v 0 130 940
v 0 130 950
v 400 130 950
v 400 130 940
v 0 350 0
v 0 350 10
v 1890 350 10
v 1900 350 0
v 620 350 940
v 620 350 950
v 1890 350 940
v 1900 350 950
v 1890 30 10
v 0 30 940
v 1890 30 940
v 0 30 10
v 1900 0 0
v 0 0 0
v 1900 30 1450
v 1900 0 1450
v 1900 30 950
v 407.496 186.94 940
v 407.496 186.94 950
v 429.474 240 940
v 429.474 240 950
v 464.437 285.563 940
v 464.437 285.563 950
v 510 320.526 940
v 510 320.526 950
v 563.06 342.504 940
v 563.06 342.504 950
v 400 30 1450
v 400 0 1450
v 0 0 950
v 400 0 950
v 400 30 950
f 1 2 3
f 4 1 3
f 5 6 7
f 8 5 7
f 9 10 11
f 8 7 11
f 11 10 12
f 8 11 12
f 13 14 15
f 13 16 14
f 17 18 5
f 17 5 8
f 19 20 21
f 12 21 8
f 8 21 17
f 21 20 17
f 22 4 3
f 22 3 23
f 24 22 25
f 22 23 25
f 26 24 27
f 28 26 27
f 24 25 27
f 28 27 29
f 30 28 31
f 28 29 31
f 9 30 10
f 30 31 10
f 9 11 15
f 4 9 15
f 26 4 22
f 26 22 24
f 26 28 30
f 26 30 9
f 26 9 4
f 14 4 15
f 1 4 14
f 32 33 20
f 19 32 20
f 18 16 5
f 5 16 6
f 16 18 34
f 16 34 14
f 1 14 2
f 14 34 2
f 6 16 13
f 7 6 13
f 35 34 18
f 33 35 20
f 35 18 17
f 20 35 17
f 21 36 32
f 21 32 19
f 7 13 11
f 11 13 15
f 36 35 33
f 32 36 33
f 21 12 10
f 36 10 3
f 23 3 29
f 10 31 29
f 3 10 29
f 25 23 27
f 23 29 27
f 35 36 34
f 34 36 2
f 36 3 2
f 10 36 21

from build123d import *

# Parameters (mm, degrees)
SKETCH1_W           = 1900
SKETCH1_H           = 950
BOSS_EXTRUDE1_DEPTH = 30
BOSS_EXTRUDE2_DEPTH = 350
BOSS_EXTRUDE4_DEPTH = 30
BOSS_EXTRUDE5_DEPTH = 10


with BuildPart() as part:
    # Sketch1 → Boss-Extrude1 (new body)
    with BuildSketch(Plane(origin=(0, 0, 0), x_dir=(1, 0, 0), z_dir=(0, 1, 0))):
        with Locations((950, -475)):
            Rectangle(SKETCH1_W, SKETCH1_H)
    extrude(amount=BOSS_EXTRUDE1_DEPTH)

    # Sketch1<3> → Boss-Extrude2 (add)
    with BuildSketch(Plane(origin=(0, 0, 0), x_dir=(1, 0, 0), z_dir=(0, 1, 0))):
        Polygon((0, 0), (0, -10), (1890, -10), (1890, -950), (1900, -950), (1900, 0), align=None)
    extrude(amount=BOSS_EXTRUDE2_DEPTH)

    # Sketch1<4> → Boss-Extrude4 (add)
    with BuildSketch(Plane(origin=(0, 0, 0), x_dir=(1, 0, 0), z_dir=(0, 1, 0))):
        Polygon((1900, -950), (1890, -950), (400, -950), (400, -1450), (1900, -1450), align=None)
    extrude(amount=BOSS_EXTRUDE4_DEPTH)

    # Sketch3 → Boss-Extrude5 (add)
    with BuildSketch(Plane.XY.offset(950)):
        with BuildLine():
            ThreePointArc((620, 350), (464.436508139, 285.563491861), (400, 130))
            Line((400, 130), (0, 130))
            Line((0, 130), (0, 30))
            Line((0, 30), (1900, 30))
            Line((1900, 30), (1900, 350))
            Line((1900, 350), (620, 350))
        make_face()
    extrude(amount=-BOSS_EXTRUDE5_DEPTH)


solid = part.part
